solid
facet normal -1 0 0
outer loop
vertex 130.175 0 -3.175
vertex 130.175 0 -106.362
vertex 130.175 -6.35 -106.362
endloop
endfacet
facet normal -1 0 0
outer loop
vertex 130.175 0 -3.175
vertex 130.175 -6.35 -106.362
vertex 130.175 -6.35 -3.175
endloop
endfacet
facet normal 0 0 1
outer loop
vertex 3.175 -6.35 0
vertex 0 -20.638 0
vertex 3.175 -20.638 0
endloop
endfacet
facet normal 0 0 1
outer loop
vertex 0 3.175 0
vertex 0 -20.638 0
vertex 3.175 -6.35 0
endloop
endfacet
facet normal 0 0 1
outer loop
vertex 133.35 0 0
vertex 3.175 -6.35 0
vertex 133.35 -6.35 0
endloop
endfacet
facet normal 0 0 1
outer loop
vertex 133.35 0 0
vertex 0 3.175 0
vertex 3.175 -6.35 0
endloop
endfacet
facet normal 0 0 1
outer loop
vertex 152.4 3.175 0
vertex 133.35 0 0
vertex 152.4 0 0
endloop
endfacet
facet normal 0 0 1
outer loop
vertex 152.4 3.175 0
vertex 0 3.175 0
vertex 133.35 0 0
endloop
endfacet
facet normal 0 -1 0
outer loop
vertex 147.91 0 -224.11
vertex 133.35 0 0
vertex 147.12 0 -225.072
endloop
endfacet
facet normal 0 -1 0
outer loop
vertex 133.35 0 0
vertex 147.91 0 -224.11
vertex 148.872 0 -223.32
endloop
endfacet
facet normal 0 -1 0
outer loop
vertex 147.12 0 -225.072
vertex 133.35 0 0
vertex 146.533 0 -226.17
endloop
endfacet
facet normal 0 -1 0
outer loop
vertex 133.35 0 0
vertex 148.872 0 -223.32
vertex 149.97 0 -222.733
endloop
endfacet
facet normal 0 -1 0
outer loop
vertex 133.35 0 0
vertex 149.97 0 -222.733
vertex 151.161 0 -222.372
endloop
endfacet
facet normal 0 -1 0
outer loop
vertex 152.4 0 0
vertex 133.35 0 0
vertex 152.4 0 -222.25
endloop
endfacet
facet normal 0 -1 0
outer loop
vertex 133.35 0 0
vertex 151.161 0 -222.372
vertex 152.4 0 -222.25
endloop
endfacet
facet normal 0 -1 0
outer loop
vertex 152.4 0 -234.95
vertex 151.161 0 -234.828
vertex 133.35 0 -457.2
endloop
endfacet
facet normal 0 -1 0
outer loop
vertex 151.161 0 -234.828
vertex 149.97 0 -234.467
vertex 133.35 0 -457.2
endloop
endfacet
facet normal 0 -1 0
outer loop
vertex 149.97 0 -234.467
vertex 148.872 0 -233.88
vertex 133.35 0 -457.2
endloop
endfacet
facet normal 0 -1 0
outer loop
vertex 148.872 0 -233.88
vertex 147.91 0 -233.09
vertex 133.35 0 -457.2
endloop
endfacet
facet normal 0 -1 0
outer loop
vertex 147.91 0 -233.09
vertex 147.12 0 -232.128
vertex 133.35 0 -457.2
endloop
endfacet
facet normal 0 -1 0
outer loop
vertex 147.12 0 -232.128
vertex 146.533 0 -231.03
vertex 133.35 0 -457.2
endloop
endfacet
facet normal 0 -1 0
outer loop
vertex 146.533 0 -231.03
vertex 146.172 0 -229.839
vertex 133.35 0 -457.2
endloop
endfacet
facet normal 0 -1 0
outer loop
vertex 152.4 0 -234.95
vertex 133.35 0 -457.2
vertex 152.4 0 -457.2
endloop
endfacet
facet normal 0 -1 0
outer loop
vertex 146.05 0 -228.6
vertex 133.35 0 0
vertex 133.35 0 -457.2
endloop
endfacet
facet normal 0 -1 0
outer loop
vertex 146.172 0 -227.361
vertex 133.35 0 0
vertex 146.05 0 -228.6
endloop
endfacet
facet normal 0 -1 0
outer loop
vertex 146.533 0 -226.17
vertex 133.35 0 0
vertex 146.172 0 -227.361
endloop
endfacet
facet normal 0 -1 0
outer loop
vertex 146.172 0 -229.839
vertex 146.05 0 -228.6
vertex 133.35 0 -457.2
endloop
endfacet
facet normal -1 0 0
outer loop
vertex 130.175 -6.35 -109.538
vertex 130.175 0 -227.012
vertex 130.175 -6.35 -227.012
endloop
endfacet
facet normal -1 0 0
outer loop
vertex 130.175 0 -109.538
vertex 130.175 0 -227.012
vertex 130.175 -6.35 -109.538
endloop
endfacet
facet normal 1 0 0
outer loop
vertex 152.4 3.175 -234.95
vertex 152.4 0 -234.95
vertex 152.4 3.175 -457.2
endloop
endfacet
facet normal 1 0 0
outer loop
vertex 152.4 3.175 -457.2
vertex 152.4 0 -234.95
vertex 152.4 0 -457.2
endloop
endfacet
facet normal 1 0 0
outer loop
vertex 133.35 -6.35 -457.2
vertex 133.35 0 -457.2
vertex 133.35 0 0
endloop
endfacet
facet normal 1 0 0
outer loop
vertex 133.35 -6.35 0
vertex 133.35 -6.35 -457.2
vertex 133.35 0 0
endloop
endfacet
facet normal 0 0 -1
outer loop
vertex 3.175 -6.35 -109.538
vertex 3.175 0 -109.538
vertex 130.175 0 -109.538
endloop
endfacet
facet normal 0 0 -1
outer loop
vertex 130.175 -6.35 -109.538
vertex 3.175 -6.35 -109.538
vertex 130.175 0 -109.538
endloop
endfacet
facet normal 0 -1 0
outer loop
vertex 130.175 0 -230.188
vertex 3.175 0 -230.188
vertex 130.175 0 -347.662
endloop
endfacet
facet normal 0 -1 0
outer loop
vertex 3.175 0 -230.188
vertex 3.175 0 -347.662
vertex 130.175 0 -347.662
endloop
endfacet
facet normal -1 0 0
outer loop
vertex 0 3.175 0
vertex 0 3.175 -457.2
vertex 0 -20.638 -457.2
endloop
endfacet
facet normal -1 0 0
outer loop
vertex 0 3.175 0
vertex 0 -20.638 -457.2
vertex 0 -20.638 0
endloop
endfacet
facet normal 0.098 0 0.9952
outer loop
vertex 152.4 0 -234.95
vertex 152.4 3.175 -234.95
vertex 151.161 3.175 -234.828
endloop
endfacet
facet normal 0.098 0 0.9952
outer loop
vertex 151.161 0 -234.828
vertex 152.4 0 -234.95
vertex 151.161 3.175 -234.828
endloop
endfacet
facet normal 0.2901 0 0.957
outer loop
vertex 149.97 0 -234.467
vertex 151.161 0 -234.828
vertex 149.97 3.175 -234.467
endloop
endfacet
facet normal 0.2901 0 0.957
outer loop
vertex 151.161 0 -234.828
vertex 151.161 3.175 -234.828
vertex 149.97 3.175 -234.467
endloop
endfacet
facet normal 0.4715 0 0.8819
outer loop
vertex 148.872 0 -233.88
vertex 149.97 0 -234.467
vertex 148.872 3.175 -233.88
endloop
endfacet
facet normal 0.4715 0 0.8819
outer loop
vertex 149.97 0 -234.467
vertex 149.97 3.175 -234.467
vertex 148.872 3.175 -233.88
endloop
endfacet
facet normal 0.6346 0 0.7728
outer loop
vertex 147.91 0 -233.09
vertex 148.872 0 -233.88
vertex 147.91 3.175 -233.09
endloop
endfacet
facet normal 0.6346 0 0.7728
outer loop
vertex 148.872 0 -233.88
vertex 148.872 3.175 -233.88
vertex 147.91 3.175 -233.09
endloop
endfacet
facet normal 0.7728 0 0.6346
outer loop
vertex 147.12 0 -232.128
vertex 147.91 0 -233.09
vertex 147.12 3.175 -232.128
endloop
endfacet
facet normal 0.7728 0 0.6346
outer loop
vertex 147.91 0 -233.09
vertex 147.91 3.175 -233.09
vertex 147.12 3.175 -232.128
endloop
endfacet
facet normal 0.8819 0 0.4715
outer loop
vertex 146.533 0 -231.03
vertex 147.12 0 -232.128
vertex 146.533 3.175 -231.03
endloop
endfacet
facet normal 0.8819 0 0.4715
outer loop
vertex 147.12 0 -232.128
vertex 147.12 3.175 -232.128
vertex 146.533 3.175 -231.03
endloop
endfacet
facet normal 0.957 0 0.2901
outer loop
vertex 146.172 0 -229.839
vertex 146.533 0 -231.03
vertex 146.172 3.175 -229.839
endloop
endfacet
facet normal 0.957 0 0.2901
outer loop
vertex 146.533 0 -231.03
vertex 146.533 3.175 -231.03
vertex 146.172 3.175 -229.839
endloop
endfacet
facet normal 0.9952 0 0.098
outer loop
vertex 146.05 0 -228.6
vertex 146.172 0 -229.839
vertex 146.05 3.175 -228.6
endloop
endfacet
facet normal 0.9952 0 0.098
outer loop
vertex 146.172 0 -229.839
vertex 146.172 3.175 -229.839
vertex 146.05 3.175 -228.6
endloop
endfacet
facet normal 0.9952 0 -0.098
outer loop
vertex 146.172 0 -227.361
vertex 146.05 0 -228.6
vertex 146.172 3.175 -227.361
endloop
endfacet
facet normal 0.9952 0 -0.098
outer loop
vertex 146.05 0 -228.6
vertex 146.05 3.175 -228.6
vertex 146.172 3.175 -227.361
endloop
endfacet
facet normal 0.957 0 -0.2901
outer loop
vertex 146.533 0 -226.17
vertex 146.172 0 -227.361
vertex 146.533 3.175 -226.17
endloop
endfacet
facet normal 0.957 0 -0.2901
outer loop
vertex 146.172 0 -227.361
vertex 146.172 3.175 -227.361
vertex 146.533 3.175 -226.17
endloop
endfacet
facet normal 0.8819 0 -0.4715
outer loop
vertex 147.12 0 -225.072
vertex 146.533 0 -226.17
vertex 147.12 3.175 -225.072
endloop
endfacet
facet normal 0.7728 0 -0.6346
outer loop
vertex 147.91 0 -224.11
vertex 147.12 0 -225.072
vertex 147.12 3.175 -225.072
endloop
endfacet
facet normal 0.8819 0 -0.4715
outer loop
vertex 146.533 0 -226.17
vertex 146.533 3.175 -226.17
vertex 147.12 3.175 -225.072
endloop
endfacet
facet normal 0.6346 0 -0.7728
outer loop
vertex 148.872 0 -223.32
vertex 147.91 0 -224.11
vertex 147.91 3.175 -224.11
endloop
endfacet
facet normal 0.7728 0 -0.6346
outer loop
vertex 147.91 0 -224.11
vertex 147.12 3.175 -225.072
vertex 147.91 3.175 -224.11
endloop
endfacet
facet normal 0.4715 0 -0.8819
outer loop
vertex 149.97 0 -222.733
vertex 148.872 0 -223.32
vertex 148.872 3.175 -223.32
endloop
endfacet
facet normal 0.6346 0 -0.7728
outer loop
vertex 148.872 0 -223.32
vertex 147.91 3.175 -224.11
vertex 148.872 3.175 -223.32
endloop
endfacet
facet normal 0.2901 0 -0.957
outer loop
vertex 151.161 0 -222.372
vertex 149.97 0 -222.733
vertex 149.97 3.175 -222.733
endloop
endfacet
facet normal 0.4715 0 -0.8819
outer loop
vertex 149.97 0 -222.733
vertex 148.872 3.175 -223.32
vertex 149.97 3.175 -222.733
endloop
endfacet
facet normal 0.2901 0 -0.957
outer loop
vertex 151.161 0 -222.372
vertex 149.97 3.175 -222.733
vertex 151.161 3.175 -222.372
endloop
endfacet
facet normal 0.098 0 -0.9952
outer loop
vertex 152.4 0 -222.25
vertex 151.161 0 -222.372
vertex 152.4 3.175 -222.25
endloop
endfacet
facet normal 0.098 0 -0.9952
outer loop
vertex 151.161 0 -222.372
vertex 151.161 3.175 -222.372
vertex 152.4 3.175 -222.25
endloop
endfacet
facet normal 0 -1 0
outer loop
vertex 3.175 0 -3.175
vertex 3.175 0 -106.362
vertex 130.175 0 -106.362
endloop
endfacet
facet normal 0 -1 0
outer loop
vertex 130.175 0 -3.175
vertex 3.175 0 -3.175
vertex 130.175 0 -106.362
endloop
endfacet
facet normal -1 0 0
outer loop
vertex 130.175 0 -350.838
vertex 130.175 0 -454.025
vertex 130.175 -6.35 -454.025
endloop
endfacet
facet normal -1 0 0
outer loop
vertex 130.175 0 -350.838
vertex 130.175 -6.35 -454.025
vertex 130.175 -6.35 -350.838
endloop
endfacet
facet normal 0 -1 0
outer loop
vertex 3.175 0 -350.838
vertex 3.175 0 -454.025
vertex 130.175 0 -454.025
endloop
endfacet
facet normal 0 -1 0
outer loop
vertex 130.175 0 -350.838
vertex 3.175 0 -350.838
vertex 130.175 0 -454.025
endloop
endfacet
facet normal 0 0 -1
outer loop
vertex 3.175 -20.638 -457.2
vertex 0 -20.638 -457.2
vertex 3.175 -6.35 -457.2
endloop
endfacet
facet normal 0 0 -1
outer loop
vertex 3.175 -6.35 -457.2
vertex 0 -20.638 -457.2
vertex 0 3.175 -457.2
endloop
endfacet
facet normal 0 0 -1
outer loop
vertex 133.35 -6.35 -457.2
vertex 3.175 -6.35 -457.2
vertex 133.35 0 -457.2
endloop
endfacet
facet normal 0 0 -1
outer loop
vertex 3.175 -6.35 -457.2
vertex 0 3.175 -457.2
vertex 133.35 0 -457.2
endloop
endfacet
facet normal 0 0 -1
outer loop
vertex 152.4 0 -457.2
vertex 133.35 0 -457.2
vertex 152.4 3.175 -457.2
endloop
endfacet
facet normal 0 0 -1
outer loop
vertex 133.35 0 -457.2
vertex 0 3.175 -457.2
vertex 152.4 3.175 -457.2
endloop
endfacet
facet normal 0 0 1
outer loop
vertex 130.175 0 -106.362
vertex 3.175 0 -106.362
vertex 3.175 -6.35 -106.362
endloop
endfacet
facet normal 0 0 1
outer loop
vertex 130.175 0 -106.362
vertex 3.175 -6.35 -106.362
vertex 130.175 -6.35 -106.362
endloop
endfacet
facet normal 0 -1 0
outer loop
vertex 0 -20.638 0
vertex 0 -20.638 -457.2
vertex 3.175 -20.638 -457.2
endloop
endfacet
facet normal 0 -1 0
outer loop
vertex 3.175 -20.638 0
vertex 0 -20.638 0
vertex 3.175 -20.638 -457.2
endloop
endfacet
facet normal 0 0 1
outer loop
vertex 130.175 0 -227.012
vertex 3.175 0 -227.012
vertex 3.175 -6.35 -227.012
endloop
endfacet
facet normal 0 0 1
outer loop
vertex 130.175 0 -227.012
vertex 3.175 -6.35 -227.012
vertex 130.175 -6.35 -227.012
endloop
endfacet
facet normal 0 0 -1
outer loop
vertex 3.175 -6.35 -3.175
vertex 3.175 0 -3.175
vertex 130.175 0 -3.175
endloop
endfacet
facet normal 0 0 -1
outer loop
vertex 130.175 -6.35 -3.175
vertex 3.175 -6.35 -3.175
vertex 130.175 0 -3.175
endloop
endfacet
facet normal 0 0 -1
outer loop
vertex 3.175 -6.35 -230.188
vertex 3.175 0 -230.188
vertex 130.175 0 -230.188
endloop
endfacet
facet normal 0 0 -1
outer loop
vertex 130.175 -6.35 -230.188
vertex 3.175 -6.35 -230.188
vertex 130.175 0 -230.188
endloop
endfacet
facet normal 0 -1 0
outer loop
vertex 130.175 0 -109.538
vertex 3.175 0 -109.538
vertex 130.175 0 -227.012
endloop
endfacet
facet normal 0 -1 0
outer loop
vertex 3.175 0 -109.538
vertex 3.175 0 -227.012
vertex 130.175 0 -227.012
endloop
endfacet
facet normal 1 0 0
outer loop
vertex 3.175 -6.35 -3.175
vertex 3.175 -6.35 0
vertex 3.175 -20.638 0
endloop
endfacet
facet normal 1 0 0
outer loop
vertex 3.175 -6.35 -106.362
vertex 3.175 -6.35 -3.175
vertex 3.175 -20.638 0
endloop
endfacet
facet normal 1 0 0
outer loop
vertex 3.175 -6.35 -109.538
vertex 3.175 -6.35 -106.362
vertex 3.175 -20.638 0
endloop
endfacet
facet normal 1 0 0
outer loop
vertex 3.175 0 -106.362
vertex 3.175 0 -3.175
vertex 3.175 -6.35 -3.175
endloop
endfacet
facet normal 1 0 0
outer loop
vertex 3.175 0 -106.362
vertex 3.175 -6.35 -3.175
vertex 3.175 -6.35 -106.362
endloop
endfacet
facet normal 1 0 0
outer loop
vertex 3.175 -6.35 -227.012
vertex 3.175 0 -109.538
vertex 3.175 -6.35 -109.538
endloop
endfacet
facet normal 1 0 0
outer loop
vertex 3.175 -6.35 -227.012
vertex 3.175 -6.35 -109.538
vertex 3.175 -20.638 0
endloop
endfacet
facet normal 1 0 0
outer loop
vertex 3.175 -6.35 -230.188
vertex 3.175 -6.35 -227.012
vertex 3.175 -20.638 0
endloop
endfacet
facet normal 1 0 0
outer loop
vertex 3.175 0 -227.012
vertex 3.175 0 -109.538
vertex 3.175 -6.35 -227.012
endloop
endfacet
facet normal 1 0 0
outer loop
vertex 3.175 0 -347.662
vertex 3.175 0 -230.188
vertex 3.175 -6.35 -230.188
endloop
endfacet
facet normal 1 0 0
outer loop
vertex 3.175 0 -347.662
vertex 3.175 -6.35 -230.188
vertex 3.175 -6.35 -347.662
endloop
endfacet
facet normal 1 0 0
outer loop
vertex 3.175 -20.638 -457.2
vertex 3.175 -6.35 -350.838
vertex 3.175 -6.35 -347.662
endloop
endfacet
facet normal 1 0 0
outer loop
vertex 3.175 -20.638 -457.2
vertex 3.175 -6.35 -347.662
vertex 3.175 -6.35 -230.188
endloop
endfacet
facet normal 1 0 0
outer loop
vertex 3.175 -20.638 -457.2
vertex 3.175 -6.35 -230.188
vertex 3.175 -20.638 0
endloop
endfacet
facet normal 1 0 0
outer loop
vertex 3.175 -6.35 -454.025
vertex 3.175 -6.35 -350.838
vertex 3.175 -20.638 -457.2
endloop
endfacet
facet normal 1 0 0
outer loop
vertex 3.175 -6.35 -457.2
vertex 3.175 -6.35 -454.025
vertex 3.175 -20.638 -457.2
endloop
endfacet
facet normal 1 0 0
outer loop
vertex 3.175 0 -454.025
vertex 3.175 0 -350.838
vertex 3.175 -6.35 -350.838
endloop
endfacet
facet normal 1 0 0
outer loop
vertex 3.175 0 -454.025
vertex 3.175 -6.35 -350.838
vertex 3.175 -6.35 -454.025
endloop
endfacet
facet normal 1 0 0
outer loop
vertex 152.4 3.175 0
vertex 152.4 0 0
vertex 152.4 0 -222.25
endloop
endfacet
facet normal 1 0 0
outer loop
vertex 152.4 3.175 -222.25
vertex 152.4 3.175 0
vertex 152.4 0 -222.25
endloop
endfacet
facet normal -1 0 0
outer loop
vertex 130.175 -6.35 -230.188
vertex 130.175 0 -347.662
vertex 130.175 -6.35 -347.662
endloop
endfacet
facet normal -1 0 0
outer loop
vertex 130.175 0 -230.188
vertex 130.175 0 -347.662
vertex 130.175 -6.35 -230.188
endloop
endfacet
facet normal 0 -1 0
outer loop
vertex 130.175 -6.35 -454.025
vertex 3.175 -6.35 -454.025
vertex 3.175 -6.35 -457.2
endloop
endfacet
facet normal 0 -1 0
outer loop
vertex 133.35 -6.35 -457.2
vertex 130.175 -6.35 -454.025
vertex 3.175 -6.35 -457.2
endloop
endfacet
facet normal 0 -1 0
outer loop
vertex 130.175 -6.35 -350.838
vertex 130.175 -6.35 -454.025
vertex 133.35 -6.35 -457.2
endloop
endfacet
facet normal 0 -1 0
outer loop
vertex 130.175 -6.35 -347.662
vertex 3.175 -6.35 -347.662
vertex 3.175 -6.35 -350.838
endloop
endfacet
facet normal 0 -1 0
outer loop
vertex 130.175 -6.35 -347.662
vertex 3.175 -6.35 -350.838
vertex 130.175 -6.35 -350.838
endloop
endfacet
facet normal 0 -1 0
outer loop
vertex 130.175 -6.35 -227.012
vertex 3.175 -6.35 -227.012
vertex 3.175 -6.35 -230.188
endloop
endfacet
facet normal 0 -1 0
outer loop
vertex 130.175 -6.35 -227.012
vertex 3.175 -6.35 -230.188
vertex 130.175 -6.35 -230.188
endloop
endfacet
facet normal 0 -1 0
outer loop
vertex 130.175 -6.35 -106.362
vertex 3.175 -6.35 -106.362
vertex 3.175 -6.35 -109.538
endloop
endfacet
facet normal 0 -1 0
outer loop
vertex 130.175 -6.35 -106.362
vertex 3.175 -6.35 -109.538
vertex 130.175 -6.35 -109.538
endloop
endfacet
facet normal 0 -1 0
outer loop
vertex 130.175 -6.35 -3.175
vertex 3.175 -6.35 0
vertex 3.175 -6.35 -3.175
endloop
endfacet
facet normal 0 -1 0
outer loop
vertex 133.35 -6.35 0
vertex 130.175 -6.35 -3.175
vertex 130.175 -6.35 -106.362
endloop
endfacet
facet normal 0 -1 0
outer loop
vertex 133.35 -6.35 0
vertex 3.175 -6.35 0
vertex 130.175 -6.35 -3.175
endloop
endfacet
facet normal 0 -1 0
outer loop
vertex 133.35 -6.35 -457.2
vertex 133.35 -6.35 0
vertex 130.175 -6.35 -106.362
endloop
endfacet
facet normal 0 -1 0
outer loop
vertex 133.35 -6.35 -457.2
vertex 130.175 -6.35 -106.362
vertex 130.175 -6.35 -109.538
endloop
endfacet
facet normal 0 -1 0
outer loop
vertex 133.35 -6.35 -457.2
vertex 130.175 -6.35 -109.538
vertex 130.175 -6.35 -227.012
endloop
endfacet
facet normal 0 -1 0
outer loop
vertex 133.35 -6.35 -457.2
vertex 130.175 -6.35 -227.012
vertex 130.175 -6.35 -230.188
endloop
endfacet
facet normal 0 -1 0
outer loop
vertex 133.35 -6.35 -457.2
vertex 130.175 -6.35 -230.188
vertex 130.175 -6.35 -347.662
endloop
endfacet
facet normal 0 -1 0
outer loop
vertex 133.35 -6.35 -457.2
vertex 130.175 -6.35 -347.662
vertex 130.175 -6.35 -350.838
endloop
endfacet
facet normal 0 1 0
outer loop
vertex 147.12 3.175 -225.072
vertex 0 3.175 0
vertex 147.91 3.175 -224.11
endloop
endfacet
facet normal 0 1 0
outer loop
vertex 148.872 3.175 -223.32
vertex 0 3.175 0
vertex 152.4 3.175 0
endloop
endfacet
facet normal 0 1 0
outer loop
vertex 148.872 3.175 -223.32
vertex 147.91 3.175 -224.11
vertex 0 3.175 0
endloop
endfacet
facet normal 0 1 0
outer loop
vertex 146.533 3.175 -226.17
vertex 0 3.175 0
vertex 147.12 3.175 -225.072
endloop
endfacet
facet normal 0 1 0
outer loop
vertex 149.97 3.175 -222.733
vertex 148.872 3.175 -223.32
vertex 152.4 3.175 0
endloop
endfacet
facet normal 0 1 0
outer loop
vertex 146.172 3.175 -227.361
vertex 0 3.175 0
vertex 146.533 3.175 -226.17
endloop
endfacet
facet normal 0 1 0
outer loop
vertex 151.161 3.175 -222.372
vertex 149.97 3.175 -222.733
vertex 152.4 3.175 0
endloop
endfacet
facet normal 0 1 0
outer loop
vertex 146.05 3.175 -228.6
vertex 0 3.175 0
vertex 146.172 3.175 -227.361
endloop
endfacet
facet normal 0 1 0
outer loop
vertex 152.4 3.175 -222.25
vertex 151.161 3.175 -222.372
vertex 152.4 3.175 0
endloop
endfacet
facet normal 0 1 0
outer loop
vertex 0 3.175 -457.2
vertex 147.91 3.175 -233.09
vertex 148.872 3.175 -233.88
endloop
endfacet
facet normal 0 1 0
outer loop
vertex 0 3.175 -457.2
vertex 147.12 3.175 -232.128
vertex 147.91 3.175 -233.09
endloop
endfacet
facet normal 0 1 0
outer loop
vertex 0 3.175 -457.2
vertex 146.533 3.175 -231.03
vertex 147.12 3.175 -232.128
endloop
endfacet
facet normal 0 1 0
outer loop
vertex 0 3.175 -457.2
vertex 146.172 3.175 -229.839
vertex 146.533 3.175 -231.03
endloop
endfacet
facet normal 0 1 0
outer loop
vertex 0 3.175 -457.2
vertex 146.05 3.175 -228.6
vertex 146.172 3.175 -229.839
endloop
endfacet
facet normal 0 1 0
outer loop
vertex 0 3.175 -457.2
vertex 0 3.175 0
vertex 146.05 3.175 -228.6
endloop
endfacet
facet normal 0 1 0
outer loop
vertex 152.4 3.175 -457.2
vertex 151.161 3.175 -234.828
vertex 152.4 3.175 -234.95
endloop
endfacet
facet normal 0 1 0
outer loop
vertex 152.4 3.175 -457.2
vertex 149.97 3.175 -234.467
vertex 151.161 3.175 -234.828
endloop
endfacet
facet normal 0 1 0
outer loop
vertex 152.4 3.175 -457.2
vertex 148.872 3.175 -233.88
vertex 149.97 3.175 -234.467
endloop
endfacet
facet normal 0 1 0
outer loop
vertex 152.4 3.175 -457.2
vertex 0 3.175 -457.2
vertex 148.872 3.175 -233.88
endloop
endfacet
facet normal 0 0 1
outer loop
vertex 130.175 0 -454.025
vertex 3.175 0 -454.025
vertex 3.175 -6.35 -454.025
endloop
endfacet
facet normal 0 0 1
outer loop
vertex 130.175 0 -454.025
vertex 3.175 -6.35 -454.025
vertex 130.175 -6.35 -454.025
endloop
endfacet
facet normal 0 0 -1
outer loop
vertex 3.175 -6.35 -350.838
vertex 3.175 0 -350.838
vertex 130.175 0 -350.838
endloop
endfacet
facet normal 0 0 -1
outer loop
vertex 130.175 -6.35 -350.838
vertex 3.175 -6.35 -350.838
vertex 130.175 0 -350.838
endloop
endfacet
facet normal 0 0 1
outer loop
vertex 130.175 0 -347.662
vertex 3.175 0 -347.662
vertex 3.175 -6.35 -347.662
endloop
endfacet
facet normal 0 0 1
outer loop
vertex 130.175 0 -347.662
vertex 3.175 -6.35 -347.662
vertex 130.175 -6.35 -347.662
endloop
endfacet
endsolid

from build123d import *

# Parameters (mm, degrees)
SKETCH1_W           = 152.4
SKETCH1_H           = 457.2
BOSS_EXTRUDE1_DEPTH = 3.175
SKETCH2_W           = 3.175
SKETCH2_H           = 457.2
BOSS_EXTRUDE2_DEPTH = 23.8125
SKETCH3_W           = 133.35
SKETCH3_H           = 3.175
BOSS_EXTRUDE3_DEPTH = 6.35
SKETCH9_W           = 3.175
SKETCH9_H           = 457.2
BOSS_EXTRUDE4_DEPTH = 6.35
SKETCH11_R          = 6.35
CUT_EXTRUDE1_DEPTH  = 483.519051599


with BuildPart() as part:
    # Sketch1 → Boss-Extrude1 (new body)
    with BuildSketch(Plane(origin=(0, 0, 0), x_dir=(1, 0, 0), z_dir=(0, 1, 0))):
        with Locations((76.2, 228.6)):
            Rectangle(SKETCH1_W, SKETCH1_H)
    extrude(amount=BOSS_EXTRUDE1_DEPTH)

    # Sketch2 → Boss-Extrude2 (add)
    with BuildSketch(Plane(origin=(0, 3.175, 0), x_dir=(1, 0, 0), z_dir=(0, 1, 0))):
        with Locations((1.5875, 228.6)):
            Rectangle(SKETCH2_W, SKETCH2_H)
    extrude(amount=-BOSS_EXTRUDE2_DEPTH)

    # Sketch3 → Boss-Extrude3 (add)
    with BuildSketch(Plane.XZ):
        with Locations((66.675, -107.95)):
            Rectangle(SKETCH3_W, SKETCH3_H)
        with Locations((66.675, -228.6)):
            Rectangle(SKETCH3_W, SKETCH3_H)
        with Locations((66.675, -349.25)):
            Rectangle(SKETCH3_W, SKETCH3_H)
        with Locations((66.675, -1.5875)):
            Rectangle(SKETCH3_W, SKETCH3_H)
        with Locations((66.675, -455.6125)):
            Rectangle(SKETCH3_W, SKETCH3_H)
    extrude(amount=BOSS_EXTRUDE3_DEPTH)

    # Sketch9 → Boss-Extrude4 (add)
    with BuildSketch(Plane.XZ):
        with Locations((131.7625, -228.6)):
            Rectangle(SKETCH9_W, SKETCH9_H)
    extrude(amount=BOSS_EXTRUDE4_DEPTH)

    # Sketch11 → Cut-Extrude1 (cut, through all)
    with BuildSketch(Plane(origin=(0, 3.175, 0), x_dir=(1, 0, 0), z_dir=(0, 1, 0))):
        with Locations((152.4, 228.6)):
            Circle(SKETCH11_R)
    extrude(amount=-CUT_EXTRUDE1_DEPTH, mode=Mode.SUBTRACT)


solid = part.part
